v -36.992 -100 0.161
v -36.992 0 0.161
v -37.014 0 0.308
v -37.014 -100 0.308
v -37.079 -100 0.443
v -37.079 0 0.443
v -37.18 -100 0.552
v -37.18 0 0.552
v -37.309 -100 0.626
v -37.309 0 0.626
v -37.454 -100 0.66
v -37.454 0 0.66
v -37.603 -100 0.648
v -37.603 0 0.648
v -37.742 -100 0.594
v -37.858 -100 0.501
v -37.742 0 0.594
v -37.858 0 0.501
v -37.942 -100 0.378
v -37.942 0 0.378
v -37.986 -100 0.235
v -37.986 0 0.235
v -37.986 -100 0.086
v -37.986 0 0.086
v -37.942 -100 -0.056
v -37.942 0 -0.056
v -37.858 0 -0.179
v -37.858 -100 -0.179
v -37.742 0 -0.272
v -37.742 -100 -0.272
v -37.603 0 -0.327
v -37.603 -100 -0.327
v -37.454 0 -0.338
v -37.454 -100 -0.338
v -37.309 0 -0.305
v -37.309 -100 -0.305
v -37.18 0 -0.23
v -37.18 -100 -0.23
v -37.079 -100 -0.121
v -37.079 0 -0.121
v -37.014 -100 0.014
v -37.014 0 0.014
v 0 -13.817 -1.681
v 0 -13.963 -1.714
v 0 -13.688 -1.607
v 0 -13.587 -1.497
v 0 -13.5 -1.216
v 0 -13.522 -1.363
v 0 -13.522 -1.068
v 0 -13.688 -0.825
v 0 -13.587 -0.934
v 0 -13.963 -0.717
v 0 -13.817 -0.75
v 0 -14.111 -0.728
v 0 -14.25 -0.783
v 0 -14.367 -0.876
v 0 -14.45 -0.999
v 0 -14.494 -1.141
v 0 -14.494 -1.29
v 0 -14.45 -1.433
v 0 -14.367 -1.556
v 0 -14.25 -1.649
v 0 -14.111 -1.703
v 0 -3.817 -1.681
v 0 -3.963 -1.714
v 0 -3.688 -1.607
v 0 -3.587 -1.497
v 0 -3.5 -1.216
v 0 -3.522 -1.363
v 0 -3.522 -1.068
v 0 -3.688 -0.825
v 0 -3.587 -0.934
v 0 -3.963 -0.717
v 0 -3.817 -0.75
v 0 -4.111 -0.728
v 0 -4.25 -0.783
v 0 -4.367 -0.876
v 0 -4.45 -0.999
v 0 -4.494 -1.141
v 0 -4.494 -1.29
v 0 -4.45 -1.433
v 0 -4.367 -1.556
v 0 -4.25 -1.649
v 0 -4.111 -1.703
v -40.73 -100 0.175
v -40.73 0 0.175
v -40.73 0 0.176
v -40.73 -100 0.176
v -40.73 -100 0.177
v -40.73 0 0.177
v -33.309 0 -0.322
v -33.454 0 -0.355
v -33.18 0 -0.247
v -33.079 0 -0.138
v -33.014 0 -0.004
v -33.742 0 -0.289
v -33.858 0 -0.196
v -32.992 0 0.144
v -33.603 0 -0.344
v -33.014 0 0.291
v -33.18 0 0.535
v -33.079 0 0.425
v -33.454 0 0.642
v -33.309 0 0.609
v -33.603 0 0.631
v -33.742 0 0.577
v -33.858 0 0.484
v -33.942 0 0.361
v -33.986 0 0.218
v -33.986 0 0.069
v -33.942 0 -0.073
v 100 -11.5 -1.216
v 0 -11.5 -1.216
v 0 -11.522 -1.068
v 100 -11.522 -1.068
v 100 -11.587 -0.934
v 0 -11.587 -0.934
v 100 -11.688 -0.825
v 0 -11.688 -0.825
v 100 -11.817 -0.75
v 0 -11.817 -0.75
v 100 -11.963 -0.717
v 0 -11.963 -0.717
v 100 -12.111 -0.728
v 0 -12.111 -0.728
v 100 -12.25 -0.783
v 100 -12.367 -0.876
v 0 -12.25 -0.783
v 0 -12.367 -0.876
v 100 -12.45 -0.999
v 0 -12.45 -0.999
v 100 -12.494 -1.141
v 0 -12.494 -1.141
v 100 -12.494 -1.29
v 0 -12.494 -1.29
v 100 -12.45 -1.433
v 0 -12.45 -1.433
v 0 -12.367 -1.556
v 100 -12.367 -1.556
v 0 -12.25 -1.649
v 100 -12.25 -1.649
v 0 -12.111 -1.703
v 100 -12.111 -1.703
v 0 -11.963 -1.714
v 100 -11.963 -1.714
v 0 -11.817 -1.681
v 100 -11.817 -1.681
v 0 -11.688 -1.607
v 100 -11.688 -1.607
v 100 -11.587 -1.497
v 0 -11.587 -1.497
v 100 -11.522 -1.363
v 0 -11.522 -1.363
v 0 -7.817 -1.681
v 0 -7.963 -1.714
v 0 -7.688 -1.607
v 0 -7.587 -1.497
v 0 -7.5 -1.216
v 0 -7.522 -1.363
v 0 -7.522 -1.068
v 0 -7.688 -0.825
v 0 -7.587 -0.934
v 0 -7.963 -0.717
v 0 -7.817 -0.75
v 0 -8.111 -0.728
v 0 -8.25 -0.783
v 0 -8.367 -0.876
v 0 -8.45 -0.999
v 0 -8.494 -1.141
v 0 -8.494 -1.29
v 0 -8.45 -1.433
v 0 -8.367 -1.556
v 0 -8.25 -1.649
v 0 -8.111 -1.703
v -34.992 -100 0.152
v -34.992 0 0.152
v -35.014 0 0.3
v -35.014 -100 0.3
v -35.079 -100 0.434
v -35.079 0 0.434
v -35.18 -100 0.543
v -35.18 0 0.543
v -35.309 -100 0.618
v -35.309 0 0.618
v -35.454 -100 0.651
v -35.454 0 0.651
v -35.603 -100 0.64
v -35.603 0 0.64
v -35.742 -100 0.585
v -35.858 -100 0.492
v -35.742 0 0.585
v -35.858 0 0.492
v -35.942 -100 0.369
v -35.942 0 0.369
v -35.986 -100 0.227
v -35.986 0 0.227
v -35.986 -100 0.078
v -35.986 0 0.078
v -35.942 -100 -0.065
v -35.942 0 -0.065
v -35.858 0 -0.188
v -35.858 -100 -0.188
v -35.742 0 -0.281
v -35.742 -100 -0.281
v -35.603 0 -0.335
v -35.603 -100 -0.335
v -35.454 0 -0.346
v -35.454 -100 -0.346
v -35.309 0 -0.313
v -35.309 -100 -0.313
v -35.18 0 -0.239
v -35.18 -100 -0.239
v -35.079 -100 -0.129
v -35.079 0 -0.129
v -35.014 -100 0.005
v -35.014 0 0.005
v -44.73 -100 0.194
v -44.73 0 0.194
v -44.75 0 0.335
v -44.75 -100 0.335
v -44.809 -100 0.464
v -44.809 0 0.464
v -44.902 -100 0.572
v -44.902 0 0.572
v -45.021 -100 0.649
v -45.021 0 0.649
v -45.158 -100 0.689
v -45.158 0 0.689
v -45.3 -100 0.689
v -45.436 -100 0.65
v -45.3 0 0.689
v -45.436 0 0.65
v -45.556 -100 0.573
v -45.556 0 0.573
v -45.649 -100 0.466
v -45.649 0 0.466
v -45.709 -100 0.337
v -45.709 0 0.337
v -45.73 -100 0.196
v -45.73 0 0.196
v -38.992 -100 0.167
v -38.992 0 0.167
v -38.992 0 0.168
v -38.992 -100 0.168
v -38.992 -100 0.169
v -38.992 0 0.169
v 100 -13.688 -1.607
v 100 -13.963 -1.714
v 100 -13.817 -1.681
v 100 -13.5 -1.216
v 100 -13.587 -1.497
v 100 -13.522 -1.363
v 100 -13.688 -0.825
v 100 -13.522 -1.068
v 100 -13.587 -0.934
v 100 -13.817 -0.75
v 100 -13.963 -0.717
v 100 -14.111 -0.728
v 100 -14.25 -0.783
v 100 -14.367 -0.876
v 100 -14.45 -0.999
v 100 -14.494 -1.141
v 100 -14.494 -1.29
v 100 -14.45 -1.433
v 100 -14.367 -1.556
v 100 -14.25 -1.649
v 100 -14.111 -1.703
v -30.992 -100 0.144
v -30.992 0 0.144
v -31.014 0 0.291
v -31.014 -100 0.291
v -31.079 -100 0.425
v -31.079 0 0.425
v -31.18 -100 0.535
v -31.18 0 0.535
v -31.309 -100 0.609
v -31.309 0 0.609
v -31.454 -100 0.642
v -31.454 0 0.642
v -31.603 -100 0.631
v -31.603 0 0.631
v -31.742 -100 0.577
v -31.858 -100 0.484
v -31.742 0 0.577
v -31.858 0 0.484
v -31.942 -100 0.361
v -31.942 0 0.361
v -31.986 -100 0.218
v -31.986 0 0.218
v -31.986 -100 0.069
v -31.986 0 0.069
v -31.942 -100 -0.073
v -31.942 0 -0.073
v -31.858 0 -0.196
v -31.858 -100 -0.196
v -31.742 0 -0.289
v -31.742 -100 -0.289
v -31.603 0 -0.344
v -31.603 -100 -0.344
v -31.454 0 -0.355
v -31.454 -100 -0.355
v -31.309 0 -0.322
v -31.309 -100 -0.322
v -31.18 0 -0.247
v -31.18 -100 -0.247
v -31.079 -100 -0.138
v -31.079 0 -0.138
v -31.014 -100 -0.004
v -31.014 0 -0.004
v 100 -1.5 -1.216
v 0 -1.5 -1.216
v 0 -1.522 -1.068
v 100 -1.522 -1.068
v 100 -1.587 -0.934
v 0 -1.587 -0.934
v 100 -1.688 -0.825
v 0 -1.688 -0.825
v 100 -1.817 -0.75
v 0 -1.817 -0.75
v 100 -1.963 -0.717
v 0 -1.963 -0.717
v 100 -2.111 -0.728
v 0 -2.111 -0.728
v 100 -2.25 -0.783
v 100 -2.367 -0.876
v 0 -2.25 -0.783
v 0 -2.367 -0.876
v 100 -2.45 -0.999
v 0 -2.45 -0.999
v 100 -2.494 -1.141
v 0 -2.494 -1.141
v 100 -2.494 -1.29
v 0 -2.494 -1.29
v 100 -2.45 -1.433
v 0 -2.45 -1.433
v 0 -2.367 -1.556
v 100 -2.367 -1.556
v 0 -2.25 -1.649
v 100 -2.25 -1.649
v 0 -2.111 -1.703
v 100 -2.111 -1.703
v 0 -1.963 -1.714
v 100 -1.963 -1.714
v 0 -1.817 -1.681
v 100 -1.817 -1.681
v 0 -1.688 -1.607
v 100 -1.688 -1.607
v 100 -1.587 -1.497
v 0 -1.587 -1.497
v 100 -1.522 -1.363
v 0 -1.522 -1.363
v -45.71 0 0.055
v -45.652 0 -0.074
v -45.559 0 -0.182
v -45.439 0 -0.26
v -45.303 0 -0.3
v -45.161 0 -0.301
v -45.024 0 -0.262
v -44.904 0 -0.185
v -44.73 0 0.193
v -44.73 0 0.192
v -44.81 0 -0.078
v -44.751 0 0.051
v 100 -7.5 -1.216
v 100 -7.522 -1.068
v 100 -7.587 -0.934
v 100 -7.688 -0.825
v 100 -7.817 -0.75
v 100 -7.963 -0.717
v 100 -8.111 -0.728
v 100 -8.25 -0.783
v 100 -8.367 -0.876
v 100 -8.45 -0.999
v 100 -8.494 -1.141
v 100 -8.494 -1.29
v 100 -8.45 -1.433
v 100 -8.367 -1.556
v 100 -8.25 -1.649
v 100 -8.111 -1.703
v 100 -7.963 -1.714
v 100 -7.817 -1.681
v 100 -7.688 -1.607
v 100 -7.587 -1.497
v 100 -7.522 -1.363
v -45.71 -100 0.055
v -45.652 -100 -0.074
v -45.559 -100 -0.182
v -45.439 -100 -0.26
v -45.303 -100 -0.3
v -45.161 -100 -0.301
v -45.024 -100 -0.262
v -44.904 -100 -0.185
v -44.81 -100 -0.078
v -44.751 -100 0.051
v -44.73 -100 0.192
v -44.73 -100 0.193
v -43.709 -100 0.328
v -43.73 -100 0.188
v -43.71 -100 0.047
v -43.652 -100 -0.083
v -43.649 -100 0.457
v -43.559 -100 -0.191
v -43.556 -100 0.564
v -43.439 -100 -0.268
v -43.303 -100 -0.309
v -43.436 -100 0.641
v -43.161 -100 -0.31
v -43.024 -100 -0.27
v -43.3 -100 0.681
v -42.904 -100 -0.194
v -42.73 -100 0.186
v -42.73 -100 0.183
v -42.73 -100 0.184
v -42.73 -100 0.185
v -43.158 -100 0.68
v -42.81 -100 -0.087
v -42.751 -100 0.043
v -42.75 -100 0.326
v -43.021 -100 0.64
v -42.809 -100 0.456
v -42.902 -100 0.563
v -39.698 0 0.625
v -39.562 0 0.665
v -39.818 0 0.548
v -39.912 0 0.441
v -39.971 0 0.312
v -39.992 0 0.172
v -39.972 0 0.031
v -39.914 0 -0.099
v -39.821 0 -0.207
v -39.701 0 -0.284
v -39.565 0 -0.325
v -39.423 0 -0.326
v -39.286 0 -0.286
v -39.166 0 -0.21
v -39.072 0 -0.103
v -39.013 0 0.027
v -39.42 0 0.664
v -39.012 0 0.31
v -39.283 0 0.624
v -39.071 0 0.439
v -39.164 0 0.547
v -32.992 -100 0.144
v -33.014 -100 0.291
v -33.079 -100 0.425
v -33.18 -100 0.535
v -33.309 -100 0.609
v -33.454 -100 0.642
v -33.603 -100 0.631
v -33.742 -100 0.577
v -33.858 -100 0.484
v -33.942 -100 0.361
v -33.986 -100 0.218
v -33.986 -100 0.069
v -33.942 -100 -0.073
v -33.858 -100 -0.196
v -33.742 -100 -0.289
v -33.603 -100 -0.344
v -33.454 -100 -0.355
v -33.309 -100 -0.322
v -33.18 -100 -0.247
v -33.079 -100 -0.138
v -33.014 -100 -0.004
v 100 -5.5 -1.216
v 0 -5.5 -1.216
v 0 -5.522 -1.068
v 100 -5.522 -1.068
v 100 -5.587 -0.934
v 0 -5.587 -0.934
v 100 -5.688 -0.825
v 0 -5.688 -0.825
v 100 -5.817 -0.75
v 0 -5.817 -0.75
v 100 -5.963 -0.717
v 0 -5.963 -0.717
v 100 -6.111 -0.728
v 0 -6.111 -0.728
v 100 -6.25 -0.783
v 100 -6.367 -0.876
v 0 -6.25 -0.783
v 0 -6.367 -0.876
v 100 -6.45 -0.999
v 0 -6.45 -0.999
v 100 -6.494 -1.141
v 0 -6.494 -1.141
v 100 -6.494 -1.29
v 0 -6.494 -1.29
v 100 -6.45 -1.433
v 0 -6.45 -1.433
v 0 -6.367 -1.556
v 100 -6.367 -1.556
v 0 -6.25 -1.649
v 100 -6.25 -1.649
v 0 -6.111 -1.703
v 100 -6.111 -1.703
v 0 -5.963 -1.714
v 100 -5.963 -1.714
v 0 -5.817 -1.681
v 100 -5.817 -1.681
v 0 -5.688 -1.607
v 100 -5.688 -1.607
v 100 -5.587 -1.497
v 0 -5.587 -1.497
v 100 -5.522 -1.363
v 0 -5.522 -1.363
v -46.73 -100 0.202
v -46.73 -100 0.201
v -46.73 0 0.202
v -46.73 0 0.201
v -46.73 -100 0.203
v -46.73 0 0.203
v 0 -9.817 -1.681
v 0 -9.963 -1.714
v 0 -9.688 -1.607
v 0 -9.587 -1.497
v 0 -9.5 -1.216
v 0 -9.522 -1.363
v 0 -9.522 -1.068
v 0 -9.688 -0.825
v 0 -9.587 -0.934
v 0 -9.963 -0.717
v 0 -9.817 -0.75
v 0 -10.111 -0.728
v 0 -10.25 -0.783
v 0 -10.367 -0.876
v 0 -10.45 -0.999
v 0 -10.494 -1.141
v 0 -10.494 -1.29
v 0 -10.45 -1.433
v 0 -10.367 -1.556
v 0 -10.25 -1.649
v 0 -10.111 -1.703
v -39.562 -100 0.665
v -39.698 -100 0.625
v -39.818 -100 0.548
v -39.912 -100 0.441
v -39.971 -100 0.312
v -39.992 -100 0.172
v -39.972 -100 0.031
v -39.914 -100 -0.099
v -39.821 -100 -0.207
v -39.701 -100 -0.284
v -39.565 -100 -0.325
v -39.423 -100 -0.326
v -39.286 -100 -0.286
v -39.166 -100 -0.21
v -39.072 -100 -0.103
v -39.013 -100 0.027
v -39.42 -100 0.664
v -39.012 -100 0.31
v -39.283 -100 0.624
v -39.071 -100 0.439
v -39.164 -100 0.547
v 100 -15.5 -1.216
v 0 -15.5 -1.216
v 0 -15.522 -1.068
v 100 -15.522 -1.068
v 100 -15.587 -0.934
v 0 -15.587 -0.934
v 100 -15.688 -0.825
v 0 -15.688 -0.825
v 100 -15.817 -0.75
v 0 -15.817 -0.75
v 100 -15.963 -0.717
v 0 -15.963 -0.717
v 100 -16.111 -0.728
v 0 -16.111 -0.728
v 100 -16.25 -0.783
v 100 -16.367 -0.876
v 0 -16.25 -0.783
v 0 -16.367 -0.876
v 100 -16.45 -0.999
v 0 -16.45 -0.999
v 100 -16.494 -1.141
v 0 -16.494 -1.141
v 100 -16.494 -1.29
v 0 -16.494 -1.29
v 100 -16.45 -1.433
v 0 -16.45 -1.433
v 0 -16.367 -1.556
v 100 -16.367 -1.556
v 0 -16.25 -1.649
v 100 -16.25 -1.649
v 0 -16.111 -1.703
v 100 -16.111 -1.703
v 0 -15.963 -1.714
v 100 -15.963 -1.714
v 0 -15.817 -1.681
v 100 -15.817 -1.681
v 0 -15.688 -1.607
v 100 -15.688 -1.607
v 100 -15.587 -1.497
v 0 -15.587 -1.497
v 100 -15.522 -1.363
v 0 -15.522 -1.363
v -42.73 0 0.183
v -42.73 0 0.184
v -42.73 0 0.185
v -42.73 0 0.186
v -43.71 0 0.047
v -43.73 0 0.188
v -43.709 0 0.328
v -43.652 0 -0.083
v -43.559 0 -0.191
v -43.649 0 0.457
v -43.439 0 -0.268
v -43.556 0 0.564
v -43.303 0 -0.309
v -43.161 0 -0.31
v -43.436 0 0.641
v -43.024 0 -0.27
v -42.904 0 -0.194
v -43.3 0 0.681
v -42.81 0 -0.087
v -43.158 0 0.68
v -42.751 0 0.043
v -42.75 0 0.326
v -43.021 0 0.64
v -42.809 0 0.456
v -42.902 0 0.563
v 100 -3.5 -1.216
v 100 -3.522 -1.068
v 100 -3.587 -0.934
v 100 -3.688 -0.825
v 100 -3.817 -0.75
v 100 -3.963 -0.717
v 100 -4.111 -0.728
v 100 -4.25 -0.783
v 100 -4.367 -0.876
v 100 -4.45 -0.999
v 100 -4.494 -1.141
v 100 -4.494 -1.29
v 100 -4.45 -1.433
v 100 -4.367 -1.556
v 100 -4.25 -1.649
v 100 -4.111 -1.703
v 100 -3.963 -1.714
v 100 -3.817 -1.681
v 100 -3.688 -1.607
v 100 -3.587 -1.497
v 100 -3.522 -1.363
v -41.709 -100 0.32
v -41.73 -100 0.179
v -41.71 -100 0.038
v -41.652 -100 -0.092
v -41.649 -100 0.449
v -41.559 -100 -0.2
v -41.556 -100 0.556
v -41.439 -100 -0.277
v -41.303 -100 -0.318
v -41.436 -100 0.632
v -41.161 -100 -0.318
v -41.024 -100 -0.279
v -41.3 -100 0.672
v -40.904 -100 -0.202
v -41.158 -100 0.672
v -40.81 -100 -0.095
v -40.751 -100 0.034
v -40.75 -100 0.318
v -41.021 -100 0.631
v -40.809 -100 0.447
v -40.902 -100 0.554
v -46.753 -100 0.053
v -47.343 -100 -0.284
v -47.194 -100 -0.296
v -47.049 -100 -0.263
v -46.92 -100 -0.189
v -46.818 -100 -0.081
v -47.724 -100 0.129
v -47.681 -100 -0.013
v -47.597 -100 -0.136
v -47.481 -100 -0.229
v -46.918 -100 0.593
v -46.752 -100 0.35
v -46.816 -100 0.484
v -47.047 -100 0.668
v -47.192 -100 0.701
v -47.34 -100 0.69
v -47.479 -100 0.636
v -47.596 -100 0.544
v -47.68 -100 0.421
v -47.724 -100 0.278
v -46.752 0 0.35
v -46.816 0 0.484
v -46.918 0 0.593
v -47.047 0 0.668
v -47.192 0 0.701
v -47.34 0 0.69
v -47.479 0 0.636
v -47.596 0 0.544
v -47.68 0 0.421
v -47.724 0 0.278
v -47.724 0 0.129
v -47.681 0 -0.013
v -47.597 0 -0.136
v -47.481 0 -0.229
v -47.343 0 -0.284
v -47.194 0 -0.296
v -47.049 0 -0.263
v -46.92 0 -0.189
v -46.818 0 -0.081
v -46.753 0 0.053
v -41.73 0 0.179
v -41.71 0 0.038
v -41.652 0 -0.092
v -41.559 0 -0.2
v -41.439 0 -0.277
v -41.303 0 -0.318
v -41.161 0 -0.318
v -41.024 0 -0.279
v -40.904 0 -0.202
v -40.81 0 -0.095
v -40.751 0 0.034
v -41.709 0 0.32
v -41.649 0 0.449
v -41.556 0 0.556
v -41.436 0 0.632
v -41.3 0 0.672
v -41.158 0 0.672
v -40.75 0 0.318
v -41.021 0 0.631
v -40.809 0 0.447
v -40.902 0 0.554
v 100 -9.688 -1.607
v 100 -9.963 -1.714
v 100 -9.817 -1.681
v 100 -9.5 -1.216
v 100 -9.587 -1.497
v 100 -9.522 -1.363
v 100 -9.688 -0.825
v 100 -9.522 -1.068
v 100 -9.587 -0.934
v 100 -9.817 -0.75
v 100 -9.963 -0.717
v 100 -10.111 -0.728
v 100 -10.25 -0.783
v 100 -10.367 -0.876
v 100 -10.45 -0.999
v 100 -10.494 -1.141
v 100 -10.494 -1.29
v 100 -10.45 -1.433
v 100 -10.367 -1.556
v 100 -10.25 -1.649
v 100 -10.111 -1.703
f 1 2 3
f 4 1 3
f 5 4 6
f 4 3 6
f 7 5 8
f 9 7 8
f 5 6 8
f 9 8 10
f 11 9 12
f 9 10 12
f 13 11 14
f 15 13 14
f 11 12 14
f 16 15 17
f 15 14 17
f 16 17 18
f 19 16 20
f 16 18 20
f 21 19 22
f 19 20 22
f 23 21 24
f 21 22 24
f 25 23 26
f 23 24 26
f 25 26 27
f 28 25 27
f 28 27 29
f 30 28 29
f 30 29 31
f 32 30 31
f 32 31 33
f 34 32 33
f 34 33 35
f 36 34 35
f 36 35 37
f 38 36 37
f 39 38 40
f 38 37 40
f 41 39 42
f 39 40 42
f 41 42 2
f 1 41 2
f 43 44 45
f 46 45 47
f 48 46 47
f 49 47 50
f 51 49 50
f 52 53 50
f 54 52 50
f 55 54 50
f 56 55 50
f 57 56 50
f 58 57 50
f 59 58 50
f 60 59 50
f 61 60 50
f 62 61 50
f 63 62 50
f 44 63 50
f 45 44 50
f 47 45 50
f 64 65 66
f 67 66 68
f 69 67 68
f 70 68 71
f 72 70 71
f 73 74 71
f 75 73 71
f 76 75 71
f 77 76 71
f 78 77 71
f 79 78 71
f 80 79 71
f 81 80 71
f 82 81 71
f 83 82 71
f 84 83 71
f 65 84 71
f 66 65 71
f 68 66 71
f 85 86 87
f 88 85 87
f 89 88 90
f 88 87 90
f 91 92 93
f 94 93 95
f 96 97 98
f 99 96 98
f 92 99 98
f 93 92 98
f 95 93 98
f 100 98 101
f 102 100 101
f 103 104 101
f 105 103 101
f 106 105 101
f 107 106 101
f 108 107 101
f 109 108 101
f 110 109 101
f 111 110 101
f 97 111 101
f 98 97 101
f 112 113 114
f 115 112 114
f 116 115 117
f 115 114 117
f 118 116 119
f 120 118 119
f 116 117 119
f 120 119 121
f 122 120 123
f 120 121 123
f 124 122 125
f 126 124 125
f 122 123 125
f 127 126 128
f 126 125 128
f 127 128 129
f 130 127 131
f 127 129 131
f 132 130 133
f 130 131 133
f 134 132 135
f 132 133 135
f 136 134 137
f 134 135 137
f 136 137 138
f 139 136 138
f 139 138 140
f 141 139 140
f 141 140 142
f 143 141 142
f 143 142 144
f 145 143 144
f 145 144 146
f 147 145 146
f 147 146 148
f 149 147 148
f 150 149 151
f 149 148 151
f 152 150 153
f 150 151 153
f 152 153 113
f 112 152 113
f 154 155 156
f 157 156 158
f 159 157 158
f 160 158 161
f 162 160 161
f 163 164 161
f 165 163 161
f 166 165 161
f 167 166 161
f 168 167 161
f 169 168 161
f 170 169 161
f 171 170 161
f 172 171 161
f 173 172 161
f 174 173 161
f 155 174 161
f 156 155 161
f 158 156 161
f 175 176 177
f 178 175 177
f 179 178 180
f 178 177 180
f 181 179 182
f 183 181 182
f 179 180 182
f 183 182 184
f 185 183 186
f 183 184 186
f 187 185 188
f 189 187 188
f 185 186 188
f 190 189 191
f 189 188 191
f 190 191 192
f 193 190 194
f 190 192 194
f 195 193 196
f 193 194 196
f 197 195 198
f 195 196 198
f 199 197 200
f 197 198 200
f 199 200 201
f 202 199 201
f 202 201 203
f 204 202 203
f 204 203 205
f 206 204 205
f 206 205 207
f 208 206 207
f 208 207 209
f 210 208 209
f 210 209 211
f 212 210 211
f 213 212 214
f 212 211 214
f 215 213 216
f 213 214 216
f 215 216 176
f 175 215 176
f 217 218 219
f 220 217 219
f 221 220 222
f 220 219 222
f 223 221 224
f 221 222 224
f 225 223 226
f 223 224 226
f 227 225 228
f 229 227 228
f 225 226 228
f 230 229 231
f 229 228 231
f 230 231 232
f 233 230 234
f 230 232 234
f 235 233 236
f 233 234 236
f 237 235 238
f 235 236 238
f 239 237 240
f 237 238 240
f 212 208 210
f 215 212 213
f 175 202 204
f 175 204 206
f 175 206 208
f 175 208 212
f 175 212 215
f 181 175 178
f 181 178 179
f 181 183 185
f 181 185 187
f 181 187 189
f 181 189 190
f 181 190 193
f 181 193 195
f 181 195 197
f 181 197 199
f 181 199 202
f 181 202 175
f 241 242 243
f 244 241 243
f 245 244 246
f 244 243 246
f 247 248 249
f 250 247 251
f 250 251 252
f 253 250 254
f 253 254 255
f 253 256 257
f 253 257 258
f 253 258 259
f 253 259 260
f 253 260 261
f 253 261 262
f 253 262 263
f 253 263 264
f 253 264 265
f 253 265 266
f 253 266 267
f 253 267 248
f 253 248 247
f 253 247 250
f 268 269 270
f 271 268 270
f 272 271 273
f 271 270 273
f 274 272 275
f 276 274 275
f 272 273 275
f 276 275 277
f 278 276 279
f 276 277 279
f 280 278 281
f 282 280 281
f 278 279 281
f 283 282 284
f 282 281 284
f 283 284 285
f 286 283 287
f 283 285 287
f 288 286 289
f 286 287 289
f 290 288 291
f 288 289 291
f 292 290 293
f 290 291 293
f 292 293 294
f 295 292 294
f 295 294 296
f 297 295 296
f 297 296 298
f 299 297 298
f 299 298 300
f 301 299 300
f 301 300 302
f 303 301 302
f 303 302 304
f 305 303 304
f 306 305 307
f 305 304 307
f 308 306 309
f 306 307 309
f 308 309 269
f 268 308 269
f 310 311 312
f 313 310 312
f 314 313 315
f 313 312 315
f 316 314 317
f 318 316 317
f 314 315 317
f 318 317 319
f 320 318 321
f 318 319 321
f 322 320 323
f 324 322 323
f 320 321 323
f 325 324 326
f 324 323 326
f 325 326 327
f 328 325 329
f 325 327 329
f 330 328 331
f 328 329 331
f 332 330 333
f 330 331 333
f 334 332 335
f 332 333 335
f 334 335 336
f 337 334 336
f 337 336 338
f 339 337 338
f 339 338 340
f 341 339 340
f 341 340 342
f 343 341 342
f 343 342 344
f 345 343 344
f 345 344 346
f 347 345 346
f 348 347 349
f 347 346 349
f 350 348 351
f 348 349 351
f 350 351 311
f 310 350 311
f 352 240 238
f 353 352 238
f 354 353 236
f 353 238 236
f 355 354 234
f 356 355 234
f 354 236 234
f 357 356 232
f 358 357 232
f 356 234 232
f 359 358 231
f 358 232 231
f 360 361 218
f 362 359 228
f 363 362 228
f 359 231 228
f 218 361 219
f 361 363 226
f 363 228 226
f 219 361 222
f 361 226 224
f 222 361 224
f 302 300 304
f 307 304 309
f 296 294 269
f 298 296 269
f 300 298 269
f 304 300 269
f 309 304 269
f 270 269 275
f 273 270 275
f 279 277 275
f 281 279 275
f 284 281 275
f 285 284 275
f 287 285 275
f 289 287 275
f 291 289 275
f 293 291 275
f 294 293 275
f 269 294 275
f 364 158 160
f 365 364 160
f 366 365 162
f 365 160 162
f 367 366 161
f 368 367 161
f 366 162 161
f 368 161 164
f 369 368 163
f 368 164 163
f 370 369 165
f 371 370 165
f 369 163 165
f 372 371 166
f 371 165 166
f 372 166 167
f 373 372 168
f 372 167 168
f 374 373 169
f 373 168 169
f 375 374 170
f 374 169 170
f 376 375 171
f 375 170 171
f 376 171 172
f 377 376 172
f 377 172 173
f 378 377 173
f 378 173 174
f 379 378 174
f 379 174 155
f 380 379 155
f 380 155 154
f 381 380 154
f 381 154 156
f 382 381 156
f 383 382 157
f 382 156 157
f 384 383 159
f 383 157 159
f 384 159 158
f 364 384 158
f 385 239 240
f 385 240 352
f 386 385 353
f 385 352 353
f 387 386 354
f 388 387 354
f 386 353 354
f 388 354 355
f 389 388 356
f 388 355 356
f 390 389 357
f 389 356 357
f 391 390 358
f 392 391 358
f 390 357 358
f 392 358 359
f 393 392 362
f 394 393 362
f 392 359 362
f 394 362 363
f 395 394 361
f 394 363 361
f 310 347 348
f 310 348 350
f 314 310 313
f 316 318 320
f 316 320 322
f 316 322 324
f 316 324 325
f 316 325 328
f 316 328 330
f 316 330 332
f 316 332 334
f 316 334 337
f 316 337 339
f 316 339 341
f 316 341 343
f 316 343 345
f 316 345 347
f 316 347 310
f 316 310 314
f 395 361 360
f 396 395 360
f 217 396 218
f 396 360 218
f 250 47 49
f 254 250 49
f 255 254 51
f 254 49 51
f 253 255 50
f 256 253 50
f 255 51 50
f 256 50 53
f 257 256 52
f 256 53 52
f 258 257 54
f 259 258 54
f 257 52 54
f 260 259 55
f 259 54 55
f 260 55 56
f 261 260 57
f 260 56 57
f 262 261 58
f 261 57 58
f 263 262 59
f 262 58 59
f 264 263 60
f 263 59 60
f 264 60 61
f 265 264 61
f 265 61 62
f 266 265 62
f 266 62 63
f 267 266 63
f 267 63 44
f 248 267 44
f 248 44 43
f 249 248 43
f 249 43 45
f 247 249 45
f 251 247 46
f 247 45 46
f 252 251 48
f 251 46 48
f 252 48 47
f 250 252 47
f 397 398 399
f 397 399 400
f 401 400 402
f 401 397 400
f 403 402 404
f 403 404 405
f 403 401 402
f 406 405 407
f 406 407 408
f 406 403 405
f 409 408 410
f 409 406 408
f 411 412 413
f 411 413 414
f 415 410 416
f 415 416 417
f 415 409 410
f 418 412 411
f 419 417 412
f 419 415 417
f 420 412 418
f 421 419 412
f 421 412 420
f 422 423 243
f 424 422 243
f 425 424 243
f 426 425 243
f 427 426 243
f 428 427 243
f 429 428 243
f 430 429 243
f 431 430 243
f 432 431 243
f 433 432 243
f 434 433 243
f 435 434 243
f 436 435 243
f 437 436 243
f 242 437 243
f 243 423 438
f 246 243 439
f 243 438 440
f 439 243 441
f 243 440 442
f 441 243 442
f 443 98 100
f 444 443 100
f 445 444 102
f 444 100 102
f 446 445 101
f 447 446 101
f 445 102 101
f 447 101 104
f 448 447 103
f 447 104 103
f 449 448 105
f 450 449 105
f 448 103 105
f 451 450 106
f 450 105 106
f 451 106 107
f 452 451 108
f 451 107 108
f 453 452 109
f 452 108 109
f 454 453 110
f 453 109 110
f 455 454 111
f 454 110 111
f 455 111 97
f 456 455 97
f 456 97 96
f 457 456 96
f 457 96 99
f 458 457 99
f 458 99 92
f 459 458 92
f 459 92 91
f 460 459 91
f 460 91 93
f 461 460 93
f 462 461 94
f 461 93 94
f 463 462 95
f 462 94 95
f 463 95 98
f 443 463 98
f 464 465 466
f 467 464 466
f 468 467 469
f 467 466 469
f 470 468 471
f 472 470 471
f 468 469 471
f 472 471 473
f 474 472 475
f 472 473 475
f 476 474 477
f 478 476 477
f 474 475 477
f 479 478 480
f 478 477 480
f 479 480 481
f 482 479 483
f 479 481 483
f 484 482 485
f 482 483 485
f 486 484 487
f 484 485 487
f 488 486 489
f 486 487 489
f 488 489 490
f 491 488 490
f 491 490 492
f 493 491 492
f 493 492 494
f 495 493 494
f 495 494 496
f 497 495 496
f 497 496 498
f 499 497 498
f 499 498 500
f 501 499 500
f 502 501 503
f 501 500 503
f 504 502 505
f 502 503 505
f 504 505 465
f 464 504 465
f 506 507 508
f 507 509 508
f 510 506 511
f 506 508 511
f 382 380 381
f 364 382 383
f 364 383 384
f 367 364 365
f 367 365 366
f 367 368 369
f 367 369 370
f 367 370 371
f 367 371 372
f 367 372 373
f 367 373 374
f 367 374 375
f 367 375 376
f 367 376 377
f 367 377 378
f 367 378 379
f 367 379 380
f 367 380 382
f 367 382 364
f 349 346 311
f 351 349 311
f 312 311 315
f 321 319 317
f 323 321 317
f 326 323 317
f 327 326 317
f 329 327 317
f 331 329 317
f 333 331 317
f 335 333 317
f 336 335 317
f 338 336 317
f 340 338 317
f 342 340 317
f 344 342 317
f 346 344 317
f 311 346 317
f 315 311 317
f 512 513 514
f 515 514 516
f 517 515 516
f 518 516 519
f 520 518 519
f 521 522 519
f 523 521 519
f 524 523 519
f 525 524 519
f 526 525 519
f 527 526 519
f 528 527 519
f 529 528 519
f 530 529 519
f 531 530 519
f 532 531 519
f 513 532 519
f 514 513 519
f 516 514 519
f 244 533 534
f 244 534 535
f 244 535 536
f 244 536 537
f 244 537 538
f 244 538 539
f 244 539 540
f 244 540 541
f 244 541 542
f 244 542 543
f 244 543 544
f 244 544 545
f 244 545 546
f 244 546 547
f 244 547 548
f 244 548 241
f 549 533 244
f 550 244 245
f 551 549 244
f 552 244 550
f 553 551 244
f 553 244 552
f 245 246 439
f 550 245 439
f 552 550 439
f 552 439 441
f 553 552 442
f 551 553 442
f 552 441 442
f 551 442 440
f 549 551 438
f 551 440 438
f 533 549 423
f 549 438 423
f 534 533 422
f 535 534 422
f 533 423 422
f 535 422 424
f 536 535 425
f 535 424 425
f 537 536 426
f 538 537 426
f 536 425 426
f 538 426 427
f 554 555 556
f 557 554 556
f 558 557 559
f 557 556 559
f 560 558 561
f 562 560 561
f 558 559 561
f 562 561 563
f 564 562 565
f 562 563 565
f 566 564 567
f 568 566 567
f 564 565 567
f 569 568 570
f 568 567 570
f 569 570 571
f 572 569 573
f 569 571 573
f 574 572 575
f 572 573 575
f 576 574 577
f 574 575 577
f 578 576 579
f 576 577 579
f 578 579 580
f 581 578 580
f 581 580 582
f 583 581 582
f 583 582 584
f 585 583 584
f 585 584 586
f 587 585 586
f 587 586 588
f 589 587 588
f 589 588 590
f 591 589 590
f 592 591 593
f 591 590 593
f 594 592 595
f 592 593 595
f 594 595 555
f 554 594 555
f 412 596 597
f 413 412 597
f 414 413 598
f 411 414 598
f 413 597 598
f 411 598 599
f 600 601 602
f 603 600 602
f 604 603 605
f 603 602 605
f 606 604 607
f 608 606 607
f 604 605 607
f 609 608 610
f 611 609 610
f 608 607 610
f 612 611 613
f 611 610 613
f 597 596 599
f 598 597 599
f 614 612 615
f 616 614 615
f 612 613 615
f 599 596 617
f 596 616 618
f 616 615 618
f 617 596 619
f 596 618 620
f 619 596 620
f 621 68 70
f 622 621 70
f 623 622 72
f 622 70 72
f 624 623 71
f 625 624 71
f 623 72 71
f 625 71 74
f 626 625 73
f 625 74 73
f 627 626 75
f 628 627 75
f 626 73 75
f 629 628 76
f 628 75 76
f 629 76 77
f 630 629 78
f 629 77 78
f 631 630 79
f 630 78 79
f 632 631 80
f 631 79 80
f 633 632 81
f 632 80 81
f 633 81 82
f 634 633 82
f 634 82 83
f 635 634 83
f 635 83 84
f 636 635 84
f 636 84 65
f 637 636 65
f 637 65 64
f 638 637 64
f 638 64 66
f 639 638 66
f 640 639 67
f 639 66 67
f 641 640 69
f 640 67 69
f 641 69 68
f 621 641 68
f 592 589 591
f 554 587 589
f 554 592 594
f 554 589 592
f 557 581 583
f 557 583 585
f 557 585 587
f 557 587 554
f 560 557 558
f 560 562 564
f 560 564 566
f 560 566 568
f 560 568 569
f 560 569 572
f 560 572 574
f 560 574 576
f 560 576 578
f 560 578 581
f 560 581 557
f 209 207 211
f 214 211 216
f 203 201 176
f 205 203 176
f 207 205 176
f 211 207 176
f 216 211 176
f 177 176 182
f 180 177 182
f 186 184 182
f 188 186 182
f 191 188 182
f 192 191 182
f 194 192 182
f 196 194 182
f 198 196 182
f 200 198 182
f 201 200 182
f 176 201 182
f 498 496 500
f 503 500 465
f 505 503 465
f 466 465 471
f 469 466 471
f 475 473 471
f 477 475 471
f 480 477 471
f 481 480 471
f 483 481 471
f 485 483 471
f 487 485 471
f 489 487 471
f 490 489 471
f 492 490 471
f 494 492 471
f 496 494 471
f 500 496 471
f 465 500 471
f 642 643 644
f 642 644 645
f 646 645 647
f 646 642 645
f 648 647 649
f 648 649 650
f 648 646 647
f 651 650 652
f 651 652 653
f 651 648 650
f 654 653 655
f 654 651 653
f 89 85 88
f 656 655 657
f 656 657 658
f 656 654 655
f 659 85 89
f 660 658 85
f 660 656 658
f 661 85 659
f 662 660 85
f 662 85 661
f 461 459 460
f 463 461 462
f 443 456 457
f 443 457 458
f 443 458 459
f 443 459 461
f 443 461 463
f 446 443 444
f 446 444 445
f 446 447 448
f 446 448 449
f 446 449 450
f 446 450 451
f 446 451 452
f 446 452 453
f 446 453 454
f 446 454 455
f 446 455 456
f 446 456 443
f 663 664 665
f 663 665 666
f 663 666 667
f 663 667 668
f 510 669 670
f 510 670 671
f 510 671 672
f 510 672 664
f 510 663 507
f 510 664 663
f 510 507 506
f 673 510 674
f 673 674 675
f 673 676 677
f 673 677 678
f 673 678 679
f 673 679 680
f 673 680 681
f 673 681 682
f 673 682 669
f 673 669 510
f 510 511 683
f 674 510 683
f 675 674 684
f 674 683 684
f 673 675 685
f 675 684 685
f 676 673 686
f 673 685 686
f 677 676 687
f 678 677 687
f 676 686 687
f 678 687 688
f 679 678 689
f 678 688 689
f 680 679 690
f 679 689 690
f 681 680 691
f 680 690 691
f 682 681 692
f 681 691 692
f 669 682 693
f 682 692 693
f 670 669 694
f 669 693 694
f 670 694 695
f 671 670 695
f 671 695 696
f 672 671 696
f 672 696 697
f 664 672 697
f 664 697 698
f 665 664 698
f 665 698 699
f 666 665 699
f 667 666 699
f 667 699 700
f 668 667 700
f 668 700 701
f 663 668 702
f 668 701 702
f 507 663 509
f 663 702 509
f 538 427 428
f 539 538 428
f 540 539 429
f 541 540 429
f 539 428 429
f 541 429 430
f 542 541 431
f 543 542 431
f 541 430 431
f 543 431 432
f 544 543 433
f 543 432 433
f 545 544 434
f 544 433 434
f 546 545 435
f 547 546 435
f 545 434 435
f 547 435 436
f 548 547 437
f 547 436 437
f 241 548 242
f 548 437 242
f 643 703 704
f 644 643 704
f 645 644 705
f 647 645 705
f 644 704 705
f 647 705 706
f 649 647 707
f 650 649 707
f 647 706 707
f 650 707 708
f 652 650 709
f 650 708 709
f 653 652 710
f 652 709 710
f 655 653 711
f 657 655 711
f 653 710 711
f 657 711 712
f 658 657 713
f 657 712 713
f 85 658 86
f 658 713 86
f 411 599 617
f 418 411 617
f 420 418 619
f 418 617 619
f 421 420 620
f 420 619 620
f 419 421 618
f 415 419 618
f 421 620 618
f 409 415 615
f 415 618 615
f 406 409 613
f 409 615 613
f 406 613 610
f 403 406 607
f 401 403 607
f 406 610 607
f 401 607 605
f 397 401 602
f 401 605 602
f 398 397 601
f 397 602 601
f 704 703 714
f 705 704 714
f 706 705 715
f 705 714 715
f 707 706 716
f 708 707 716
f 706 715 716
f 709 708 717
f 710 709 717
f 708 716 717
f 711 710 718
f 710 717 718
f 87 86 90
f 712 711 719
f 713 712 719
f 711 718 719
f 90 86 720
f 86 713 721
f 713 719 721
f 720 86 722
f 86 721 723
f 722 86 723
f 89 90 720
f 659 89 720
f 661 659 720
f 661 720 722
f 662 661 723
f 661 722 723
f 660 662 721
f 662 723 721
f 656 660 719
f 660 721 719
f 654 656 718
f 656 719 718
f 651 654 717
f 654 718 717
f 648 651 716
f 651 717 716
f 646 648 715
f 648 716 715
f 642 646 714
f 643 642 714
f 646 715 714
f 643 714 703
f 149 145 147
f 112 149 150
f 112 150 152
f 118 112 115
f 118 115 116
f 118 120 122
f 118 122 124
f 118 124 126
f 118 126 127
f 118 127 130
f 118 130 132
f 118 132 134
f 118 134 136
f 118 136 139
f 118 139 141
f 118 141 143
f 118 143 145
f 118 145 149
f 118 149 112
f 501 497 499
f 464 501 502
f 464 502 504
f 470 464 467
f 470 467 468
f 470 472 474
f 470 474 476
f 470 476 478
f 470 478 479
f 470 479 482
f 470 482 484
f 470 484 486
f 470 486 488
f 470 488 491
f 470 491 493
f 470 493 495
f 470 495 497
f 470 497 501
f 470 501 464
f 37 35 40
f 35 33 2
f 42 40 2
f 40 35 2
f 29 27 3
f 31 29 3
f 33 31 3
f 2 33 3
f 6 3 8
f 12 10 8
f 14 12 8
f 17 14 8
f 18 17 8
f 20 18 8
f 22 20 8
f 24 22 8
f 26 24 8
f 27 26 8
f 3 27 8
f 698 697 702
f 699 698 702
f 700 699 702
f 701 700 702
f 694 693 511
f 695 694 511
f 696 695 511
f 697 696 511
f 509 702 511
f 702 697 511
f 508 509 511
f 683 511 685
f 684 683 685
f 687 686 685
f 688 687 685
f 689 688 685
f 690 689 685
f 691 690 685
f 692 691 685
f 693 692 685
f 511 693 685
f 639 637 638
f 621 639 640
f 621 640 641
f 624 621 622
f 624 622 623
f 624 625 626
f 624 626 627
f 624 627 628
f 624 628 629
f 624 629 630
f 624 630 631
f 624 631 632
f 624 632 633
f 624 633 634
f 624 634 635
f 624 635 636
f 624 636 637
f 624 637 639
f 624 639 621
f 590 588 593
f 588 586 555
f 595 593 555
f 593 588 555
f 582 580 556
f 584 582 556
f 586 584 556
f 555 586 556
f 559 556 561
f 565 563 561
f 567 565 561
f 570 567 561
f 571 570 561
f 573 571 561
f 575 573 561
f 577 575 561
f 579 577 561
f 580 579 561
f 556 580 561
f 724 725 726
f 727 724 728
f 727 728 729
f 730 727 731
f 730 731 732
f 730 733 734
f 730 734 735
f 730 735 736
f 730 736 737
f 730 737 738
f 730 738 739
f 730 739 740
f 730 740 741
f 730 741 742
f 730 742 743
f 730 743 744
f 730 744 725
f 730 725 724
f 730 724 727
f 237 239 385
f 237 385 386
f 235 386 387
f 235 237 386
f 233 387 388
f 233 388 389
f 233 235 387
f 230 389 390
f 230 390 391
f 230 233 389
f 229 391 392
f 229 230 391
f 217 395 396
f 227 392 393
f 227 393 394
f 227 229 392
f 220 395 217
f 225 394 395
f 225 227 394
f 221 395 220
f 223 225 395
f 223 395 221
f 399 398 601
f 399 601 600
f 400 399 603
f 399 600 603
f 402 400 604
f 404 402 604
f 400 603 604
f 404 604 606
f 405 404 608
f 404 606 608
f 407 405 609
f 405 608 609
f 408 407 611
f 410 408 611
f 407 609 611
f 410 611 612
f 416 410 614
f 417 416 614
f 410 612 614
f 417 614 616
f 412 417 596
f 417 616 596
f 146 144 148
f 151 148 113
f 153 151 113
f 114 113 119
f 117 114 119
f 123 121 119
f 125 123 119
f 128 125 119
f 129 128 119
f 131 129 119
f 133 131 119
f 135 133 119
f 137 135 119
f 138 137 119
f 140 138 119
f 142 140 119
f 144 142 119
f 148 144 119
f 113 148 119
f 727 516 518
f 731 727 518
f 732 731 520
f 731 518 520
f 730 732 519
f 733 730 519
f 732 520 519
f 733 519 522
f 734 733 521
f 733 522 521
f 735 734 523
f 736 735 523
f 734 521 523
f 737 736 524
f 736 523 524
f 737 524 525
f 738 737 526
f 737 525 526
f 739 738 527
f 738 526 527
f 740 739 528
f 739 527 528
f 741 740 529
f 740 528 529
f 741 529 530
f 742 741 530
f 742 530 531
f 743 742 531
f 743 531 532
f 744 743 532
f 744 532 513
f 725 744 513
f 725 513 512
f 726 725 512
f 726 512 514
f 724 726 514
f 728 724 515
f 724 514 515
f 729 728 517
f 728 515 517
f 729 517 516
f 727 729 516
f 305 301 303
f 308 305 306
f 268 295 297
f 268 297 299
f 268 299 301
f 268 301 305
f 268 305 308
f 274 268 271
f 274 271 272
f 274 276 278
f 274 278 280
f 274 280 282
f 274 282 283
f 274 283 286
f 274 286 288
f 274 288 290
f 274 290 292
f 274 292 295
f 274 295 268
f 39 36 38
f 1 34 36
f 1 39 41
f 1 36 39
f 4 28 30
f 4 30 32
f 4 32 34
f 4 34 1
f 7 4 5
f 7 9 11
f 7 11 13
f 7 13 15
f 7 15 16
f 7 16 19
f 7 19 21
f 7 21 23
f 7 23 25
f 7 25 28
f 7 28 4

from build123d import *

# Parameters (mm, degrees)
F1_R     = 0.5
F2_DEPTH = 100
F3_R     = 0.5
F4_DEPTH = 100


with BuildPart() as f2:
    # F0 (on Front) + F1 (on Front) → F2 (new body)
    with BuildSketch(Plane.XZ):
        with BuildLine():
            ThreePointArc((-46.729733, 0.202703), (-47.729732, 0.203776), (-46.729738, 0.200557))
            ThreePointArc((-46.729738, 0.200557), (-46.729734, 0.20163), (-46.729733, 0.202703))
        make_face()
        with BuildLine():
            Line((-45.729729, 0.196265), (-44.729738, 0.191973))
            ThreePointArc((-44.729738, 0.191973), (-44.729734, 0.193046), (-44.729733, 0.194119))
            ThreePointArc((-44.729733, 0.194119), (-45.22866, 0.694118), (-45.729729, 0.196265))
        make_face()
        with BuildLine():
            ThreePointArc((-45.729729, 0.196265), (-45.231879, -0.305876), (-44.729738, 0.191973))
            Line((-44.729738, 0.191973), (-45.729729, 0.196265))
        make_face()
        with BuildLine():
            ThreePointArc((-43.729729, 0.187681), (-43.231879, -0.31446), (-42.729738, 0.183389))
            Line((-42.729738, 0.183389), (-43.729729, 0.187681))
        make_face()
        with BuildLine():
            Line((-43.729729, 0.187681), (-42.729738, 0.183389))
            ThreePointArc((-42.729738, 0.183389), (-42.729734, 0.184462), (-42.729733, 0.185535))
            ThreePointArc((-42.729733, 0.185535), (-43.22866, 0.685534), (-43.729729, 0.187681))
        make_face()
        with BuildLine():
            Line((-41.729729, 0.179098), (-40.729738, 0.174806))
            ThreePointArc((-40.729738, 0.174806), (-40.729734, 0.175879), (-40.729733, 0.176952))
            ThreePointArc((-40.729733, 0.176952), (-41.22866, 0.67695), (-41.729729, 0.179098))
        make_face()
        with BuildLine():
            ThreePointArc((-41.729729, 0.179098), (-41.231879, -0.323044), (-40.729738, 0.174806))
            Line((-40.729738, 0.174806), (-41.729729, 0.179098))
        make_face()
        with BuildLine():
            Line((-39.991835, 0.171639), (-38.991844, 0.167347))
            ThreePointArc((-38.991844, 0.167347), (-38.991841, 0.16842), (-38.991839, 0.169493))
            ThreePointArc((-38.991839, 0.169493), (-39.490766, 0.669492), (-39.991835, 0.171639))
        make_face()
        with BuildLine():
            ThreePointArc((-39.991835, 0.171639), (-39.493985, -0.330503), (-38.991844, 0.167347))
            Line((-38.991844, 0.167347), (-39.991835, 0.171639))
        make_face()
    with BuildSketch(Plane.XZ):
        with Locations((-35.491839, 0.152325)):
            Circle(F1_R)
        with Locations((-33.491839, 0.143742)):
            Circle(F1_R)
        with Locations((-37.491839, 0.160909)):
            Circle(F1_R)
        with Locations((-31.491839, 0.143742)):
            Circle(F1_R)
    extrude(amount=F2_DEPTH)


with BuildPart() as f4:
    # F3 (on Right) → F4 (new body)
    with BuildSketch(Plane.YZ):
        with Locations((-16, -1.215745)):
            Circle(F3_R)
        with Locations((-14, -1.215745)):
            Circle(F3_R)
        with Locations((-12, -1.215745)):
            Circle(F3_R)
        with Locations((-10, -1.215745)):
            Circle(F3_R)
        with Locations((-8, -1.215745)):
            Circle(F3_R)
        with Locations((-6, -1.215745)):
            Circle(F3_R)
        with Locations((-4, -1.215745)):
            Circle(F3_R)
        with Locations((-2, -1.215745)):
            Circle(F3_R)
    extrude(amount=F4_DEPTH)


solid = Compound([f2.part, f4.part])
